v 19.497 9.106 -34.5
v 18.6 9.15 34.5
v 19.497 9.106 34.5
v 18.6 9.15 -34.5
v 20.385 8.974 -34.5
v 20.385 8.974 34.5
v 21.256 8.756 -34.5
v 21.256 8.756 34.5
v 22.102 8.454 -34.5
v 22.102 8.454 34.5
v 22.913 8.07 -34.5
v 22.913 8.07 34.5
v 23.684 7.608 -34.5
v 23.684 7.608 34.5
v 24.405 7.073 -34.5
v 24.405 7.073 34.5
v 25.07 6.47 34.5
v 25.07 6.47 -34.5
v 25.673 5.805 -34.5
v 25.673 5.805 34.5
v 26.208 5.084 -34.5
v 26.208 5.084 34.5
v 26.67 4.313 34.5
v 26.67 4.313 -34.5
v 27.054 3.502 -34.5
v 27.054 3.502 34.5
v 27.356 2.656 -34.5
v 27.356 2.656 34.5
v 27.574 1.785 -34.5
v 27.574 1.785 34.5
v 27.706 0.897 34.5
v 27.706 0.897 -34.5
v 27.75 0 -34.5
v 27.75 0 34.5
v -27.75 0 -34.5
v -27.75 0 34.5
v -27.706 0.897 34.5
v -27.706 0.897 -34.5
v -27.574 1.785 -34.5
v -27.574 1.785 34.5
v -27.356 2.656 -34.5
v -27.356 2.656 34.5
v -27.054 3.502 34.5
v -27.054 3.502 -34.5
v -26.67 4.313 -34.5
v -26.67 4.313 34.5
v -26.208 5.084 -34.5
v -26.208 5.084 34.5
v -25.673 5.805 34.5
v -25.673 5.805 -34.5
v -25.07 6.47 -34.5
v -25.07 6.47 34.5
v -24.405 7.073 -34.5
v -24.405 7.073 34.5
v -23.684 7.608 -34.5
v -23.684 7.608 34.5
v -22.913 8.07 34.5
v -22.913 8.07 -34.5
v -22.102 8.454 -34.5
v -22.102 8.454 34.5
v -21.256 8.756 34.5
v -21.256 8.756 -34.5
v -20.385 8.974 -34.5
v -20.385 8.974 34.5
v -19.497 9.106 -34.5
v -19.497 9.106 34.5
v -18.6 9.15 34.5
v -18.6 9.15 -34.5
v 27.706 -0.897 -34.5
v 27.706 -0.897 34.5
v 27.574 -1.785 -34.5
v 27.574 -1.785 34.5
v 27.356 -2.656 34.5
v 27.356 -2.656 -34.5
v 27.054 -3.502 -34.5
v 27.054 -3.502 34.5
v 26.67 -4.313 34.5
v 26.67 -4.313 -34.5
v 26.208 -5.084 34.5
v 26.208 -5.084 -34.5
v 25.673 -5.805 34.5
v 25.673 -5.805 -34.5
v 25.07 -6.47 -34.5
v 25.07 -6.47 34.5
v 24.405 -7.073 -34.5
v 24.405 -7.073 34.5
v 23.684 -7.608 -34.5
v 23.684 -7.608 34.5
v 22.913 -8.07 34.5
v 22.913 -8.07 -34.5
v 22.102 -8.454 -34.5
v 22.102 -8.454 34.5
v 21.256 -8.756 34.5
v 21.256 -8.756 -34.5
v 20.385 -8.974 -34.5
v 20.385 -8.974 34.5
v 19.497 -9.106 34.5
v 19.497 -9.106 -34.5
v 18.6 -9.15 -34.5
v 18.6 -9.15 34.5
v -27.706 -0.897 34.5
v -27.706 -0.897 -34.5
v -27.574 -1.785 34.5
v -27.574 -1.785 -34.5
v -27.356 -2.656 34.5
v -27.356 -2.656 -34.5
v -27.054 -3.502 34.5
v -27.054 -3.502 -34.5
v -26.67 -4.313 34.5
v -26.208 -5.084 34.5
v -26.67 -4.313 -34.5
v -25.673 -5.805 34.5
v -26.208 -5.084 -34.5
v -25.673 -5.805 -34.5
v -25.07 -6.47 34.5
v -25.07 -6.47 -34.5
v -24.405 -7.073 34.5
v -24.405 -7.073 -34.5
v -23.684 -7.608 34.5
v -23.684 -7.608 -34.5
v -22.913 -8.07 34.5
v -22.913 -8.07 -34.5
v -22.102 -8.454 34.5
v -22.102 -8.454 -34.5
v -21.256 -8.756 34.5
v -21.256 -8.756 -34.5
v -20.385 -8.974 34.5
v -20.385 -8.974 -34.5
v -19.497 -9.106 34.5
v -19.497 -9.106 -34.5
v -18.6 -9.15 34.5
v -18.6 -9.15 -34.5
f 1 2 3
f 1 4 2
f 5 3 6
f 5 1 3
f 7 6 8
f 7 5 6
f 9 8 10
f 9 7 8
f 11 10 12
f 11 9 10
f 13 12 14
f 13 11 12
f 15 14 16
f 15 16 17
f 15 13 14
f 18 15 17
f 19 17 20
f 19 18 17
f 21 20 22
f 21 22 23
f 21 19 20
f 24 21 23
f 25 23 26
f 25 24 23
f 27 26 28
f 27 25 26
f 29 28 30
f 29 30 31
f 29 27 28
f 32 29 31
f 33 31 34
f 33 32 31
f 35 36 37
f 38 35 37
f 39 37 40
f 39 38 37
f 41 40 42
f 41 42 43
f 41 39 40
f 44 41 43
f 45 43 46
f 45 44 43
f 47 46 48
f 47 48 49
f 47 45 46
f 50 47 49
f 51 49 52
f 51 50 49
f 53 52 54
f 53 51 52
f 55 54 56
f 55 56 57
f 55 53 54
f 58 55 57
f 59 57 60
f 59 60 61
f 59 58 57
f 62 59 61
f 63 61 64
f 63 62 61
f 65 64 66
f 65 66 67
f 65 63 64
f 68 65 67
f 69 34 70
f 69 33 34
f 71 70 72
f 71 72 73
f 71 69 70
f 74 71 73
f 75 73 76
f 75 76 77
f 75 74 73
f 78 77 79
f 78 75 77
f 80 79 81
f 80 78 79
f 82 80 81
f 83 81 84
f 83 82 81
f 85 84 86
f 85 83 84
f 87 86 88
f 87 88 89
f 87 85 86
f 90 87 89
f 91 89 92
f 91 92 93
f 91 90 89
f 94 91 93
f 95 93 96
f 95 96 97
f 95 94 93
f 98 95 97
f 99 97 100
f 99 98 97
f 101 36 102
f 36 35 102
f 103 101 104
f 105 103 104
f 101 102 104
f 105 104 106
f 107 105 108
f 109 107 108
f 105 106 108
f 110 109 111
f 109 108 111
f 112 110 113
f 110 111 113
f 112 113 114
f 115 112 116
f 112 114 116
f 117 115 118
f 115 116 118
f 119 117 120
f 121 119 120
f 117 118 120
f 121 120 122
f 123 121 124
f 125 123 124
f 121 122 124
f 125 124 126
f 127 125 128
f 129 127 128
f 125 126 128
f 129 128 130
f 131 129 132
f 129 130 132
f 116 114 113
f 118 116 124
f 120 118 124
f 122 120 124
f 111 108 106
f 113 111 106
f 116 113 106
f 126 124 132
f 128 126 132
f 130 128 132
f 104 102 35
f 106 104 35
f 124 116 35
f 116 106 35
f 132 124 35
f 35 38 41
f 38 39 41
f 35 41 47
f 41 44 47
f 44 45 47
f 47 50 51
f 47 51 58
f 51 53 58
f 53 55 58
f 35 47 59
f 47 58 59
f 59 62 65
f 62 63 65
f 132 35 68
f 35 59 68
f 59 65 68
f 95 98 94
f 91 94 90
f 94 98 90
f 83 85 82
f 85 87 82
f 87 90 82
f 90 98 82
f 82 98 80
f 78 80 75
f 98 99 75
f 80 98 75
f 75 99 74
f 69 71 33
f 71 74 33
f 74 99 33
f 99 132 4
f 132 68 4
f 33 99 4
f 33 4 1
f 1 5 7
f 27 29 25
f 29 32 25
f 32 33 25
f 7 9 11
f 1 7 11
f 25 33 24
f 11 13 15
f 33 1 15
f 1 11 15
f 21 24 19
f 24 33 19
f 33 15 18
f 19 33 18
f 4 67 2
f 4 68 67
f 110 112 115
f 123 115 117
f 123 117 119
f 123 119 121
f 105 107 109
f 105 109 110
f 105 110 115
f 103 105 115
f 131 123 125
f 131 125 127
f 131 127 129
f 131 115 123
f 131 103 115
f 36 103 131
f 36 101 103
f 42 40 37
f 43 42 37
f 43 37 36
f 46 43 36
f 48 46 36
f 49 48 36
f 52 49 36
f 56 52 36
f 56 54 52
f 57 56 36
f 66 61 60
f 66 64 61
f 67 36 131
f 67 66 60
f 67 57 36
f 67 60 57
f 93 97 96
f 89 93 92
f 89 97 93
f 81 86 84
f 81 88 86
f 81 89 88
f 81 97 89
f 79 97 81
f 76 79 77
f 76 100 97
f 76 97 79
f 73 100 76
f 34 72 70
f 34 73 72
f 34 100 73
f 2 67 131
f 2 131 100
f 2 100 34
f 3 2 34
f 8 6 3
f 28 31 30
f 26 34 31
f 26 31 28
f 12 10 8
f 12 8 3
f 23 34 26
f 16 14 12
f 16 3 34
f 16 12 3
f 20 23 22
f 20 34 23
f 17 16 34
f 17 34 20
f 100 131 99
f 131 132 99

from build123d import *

# Parameters (mm, degrees)
SKETCH1_W           = 55.5
SKETCH1_H           = 69
BOSS_EXTRUDE1_DEPTH = 9.15
FILLET1_R           = 9.15


with BuildPart() as part:
    # Sketch1 → Boss-Extrude1 (new, symmetric)
    with BuildSketch(Plane(origin=(0, 0, 0), x_dir=(1, 0, 0), z_dir=(0, 1, 0))):
        Rectangle(SKETCH1_W, SKETCH1_H)
    extrude(amount=BOSS_EXTRUDE1_DEPTH, both=True)

    # Fillet1
    fillet1_edges = [part.edges().sort_by_distance(p)[0] for p in [
        (27.75, -9.15, 0),
        (27.75, 9.15, 0),
        (-27.75, -9.15, 0),
        (-27.75, 9.15, 0),
    ]]
    fillet(fillet1_edges, radius=FILLET1_R - 0.0001)  # a hair under: the kernel refuses the full size


solid = part.part
